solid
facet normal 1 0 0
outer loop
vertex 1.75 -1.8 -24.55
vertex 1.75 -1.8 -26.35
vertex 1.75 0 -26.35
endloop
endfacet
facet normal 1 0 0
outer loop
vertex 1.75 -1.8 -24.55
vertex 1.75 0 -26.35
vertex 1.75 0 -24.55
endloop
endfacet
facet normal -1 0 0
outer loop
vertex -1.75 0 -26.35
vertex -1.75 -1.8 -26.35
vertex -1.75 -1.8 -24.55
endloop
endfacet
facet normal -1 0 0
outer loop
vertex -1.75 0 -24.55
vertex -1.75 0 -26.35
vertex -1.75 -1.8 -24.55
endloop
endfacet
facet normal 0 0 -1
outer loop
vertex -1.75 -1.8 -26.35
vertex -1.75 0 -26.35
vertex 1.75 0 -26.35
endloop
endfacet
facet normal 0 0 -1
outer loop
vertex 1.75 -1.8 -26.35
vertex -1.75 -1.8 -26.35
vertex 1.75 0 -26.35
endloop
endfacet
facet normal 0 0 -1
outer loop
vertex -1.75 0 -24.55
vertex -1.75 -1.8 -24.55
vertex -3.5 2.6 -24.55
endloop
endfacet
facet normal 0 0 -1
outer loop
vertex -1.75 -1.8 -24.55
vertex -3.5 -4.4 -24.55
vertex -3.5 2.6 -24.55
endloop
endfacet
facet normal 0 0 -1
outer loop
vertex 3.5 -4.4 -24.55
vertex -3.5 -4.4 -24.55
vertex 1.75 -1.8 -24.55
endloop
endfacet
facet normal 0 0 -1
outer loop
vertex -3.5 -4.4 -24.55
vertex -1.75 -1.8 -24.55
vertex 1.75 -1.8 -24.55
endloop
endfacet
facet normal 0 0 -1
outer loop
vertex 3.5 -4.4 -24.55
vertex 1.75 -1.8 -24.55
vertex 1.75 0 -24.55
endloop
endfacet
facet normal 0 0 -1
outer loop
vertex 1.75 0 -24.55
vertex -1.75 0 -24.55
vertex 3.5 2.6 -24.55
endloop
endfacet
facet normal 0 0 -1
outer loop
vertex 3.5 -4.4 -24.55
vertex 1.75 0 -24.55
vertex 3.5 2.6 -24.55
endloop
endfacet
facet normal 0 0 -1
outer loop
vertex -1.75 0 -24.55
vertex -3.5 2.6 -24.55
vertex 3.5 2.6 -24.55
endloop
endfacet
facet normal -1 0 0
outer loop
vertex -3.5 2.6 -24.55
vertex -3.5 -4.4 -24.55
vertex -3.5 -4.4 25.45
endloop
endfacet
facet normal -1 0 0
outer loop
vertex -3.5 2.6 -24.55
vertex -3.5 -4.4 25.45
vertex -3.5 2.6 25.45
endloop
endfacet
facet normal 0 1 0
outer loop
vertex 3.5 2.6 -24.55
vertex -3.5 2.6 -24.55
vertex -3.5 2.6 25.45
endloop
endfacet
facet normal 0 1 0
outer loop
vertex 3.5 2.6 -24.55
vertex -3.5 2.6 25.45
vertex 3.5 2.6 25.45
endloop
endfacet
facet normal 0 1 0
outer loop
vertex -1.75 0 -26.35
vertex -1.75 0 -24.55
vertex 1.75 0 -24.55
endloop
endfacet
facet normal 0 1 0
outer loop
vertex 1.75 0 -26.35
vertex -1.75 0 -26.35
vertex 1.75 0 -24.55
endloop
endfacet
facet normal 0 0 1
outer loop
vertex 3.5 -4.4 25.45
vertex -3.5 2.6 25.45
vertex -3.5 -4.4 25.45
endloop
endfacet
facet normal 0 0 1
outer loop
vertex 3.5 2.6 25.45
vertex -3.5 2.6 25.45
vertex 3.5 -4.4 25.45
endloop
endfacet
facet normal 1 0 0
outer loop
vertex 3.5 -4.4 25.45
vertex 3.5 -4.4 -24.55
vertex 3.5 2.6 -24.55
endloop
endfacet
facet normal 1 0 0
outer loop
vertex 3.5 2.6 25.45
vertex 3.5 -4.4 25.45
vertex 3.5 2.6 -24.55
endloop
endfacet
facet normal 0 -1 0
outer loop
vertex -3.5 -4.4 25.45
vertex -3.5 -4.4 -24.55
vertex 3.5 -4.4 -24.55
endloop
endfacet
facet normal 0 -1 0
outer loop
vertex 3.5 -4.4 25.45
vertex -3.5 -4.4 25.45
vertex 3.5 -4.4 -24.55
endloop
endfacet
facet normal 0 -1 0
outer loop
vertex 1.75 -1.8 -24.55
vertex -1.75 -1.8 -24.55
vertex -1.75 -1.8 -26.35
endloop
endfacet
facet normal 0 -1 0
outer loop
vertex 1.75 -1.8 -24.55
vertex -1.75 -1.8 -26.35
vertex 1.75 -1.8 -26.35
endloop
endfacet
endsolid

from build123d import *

# Parameters (mm, degrees)
F0_W     = 3.5
F0_H     = 1.8
F1_DEPTH = 1.8
F2_W     = 7
F2_H     = 7
F2_W_2   = 3.5
F2_H_2   = 1.8
F3_DEPTH = 50


# Not quite as in the source:
# - a feature names something its author has since deleted; it is built from what else it names


with BuildPart() as f1:
    # F0 (on Front) → F1 (new body)
    with BuildSketch(Plane.XZ):
        with Locations((0, -25.45)):
            Rectangle(F0_W, F0_H)
    extrude(amount=F1_DEPTH)

    # F2 (on face) → F3 (join)
    with BuildSketch(Plane.XY.offset(-24.55)):
        with Locations((0, -0.9)):
            Rectangle(F2_W, F2_H)
        with Locations((0, -0.9)):
            Rectangle(F2_W_2, F2_H_2, mode=Mode.SUBTRACT)
        with Locations((0, -0.9)):
            Rectangle(F2_W_2, F2_H_2)
    extrude(amount=F3_DEPTH)


solid = f1.part
